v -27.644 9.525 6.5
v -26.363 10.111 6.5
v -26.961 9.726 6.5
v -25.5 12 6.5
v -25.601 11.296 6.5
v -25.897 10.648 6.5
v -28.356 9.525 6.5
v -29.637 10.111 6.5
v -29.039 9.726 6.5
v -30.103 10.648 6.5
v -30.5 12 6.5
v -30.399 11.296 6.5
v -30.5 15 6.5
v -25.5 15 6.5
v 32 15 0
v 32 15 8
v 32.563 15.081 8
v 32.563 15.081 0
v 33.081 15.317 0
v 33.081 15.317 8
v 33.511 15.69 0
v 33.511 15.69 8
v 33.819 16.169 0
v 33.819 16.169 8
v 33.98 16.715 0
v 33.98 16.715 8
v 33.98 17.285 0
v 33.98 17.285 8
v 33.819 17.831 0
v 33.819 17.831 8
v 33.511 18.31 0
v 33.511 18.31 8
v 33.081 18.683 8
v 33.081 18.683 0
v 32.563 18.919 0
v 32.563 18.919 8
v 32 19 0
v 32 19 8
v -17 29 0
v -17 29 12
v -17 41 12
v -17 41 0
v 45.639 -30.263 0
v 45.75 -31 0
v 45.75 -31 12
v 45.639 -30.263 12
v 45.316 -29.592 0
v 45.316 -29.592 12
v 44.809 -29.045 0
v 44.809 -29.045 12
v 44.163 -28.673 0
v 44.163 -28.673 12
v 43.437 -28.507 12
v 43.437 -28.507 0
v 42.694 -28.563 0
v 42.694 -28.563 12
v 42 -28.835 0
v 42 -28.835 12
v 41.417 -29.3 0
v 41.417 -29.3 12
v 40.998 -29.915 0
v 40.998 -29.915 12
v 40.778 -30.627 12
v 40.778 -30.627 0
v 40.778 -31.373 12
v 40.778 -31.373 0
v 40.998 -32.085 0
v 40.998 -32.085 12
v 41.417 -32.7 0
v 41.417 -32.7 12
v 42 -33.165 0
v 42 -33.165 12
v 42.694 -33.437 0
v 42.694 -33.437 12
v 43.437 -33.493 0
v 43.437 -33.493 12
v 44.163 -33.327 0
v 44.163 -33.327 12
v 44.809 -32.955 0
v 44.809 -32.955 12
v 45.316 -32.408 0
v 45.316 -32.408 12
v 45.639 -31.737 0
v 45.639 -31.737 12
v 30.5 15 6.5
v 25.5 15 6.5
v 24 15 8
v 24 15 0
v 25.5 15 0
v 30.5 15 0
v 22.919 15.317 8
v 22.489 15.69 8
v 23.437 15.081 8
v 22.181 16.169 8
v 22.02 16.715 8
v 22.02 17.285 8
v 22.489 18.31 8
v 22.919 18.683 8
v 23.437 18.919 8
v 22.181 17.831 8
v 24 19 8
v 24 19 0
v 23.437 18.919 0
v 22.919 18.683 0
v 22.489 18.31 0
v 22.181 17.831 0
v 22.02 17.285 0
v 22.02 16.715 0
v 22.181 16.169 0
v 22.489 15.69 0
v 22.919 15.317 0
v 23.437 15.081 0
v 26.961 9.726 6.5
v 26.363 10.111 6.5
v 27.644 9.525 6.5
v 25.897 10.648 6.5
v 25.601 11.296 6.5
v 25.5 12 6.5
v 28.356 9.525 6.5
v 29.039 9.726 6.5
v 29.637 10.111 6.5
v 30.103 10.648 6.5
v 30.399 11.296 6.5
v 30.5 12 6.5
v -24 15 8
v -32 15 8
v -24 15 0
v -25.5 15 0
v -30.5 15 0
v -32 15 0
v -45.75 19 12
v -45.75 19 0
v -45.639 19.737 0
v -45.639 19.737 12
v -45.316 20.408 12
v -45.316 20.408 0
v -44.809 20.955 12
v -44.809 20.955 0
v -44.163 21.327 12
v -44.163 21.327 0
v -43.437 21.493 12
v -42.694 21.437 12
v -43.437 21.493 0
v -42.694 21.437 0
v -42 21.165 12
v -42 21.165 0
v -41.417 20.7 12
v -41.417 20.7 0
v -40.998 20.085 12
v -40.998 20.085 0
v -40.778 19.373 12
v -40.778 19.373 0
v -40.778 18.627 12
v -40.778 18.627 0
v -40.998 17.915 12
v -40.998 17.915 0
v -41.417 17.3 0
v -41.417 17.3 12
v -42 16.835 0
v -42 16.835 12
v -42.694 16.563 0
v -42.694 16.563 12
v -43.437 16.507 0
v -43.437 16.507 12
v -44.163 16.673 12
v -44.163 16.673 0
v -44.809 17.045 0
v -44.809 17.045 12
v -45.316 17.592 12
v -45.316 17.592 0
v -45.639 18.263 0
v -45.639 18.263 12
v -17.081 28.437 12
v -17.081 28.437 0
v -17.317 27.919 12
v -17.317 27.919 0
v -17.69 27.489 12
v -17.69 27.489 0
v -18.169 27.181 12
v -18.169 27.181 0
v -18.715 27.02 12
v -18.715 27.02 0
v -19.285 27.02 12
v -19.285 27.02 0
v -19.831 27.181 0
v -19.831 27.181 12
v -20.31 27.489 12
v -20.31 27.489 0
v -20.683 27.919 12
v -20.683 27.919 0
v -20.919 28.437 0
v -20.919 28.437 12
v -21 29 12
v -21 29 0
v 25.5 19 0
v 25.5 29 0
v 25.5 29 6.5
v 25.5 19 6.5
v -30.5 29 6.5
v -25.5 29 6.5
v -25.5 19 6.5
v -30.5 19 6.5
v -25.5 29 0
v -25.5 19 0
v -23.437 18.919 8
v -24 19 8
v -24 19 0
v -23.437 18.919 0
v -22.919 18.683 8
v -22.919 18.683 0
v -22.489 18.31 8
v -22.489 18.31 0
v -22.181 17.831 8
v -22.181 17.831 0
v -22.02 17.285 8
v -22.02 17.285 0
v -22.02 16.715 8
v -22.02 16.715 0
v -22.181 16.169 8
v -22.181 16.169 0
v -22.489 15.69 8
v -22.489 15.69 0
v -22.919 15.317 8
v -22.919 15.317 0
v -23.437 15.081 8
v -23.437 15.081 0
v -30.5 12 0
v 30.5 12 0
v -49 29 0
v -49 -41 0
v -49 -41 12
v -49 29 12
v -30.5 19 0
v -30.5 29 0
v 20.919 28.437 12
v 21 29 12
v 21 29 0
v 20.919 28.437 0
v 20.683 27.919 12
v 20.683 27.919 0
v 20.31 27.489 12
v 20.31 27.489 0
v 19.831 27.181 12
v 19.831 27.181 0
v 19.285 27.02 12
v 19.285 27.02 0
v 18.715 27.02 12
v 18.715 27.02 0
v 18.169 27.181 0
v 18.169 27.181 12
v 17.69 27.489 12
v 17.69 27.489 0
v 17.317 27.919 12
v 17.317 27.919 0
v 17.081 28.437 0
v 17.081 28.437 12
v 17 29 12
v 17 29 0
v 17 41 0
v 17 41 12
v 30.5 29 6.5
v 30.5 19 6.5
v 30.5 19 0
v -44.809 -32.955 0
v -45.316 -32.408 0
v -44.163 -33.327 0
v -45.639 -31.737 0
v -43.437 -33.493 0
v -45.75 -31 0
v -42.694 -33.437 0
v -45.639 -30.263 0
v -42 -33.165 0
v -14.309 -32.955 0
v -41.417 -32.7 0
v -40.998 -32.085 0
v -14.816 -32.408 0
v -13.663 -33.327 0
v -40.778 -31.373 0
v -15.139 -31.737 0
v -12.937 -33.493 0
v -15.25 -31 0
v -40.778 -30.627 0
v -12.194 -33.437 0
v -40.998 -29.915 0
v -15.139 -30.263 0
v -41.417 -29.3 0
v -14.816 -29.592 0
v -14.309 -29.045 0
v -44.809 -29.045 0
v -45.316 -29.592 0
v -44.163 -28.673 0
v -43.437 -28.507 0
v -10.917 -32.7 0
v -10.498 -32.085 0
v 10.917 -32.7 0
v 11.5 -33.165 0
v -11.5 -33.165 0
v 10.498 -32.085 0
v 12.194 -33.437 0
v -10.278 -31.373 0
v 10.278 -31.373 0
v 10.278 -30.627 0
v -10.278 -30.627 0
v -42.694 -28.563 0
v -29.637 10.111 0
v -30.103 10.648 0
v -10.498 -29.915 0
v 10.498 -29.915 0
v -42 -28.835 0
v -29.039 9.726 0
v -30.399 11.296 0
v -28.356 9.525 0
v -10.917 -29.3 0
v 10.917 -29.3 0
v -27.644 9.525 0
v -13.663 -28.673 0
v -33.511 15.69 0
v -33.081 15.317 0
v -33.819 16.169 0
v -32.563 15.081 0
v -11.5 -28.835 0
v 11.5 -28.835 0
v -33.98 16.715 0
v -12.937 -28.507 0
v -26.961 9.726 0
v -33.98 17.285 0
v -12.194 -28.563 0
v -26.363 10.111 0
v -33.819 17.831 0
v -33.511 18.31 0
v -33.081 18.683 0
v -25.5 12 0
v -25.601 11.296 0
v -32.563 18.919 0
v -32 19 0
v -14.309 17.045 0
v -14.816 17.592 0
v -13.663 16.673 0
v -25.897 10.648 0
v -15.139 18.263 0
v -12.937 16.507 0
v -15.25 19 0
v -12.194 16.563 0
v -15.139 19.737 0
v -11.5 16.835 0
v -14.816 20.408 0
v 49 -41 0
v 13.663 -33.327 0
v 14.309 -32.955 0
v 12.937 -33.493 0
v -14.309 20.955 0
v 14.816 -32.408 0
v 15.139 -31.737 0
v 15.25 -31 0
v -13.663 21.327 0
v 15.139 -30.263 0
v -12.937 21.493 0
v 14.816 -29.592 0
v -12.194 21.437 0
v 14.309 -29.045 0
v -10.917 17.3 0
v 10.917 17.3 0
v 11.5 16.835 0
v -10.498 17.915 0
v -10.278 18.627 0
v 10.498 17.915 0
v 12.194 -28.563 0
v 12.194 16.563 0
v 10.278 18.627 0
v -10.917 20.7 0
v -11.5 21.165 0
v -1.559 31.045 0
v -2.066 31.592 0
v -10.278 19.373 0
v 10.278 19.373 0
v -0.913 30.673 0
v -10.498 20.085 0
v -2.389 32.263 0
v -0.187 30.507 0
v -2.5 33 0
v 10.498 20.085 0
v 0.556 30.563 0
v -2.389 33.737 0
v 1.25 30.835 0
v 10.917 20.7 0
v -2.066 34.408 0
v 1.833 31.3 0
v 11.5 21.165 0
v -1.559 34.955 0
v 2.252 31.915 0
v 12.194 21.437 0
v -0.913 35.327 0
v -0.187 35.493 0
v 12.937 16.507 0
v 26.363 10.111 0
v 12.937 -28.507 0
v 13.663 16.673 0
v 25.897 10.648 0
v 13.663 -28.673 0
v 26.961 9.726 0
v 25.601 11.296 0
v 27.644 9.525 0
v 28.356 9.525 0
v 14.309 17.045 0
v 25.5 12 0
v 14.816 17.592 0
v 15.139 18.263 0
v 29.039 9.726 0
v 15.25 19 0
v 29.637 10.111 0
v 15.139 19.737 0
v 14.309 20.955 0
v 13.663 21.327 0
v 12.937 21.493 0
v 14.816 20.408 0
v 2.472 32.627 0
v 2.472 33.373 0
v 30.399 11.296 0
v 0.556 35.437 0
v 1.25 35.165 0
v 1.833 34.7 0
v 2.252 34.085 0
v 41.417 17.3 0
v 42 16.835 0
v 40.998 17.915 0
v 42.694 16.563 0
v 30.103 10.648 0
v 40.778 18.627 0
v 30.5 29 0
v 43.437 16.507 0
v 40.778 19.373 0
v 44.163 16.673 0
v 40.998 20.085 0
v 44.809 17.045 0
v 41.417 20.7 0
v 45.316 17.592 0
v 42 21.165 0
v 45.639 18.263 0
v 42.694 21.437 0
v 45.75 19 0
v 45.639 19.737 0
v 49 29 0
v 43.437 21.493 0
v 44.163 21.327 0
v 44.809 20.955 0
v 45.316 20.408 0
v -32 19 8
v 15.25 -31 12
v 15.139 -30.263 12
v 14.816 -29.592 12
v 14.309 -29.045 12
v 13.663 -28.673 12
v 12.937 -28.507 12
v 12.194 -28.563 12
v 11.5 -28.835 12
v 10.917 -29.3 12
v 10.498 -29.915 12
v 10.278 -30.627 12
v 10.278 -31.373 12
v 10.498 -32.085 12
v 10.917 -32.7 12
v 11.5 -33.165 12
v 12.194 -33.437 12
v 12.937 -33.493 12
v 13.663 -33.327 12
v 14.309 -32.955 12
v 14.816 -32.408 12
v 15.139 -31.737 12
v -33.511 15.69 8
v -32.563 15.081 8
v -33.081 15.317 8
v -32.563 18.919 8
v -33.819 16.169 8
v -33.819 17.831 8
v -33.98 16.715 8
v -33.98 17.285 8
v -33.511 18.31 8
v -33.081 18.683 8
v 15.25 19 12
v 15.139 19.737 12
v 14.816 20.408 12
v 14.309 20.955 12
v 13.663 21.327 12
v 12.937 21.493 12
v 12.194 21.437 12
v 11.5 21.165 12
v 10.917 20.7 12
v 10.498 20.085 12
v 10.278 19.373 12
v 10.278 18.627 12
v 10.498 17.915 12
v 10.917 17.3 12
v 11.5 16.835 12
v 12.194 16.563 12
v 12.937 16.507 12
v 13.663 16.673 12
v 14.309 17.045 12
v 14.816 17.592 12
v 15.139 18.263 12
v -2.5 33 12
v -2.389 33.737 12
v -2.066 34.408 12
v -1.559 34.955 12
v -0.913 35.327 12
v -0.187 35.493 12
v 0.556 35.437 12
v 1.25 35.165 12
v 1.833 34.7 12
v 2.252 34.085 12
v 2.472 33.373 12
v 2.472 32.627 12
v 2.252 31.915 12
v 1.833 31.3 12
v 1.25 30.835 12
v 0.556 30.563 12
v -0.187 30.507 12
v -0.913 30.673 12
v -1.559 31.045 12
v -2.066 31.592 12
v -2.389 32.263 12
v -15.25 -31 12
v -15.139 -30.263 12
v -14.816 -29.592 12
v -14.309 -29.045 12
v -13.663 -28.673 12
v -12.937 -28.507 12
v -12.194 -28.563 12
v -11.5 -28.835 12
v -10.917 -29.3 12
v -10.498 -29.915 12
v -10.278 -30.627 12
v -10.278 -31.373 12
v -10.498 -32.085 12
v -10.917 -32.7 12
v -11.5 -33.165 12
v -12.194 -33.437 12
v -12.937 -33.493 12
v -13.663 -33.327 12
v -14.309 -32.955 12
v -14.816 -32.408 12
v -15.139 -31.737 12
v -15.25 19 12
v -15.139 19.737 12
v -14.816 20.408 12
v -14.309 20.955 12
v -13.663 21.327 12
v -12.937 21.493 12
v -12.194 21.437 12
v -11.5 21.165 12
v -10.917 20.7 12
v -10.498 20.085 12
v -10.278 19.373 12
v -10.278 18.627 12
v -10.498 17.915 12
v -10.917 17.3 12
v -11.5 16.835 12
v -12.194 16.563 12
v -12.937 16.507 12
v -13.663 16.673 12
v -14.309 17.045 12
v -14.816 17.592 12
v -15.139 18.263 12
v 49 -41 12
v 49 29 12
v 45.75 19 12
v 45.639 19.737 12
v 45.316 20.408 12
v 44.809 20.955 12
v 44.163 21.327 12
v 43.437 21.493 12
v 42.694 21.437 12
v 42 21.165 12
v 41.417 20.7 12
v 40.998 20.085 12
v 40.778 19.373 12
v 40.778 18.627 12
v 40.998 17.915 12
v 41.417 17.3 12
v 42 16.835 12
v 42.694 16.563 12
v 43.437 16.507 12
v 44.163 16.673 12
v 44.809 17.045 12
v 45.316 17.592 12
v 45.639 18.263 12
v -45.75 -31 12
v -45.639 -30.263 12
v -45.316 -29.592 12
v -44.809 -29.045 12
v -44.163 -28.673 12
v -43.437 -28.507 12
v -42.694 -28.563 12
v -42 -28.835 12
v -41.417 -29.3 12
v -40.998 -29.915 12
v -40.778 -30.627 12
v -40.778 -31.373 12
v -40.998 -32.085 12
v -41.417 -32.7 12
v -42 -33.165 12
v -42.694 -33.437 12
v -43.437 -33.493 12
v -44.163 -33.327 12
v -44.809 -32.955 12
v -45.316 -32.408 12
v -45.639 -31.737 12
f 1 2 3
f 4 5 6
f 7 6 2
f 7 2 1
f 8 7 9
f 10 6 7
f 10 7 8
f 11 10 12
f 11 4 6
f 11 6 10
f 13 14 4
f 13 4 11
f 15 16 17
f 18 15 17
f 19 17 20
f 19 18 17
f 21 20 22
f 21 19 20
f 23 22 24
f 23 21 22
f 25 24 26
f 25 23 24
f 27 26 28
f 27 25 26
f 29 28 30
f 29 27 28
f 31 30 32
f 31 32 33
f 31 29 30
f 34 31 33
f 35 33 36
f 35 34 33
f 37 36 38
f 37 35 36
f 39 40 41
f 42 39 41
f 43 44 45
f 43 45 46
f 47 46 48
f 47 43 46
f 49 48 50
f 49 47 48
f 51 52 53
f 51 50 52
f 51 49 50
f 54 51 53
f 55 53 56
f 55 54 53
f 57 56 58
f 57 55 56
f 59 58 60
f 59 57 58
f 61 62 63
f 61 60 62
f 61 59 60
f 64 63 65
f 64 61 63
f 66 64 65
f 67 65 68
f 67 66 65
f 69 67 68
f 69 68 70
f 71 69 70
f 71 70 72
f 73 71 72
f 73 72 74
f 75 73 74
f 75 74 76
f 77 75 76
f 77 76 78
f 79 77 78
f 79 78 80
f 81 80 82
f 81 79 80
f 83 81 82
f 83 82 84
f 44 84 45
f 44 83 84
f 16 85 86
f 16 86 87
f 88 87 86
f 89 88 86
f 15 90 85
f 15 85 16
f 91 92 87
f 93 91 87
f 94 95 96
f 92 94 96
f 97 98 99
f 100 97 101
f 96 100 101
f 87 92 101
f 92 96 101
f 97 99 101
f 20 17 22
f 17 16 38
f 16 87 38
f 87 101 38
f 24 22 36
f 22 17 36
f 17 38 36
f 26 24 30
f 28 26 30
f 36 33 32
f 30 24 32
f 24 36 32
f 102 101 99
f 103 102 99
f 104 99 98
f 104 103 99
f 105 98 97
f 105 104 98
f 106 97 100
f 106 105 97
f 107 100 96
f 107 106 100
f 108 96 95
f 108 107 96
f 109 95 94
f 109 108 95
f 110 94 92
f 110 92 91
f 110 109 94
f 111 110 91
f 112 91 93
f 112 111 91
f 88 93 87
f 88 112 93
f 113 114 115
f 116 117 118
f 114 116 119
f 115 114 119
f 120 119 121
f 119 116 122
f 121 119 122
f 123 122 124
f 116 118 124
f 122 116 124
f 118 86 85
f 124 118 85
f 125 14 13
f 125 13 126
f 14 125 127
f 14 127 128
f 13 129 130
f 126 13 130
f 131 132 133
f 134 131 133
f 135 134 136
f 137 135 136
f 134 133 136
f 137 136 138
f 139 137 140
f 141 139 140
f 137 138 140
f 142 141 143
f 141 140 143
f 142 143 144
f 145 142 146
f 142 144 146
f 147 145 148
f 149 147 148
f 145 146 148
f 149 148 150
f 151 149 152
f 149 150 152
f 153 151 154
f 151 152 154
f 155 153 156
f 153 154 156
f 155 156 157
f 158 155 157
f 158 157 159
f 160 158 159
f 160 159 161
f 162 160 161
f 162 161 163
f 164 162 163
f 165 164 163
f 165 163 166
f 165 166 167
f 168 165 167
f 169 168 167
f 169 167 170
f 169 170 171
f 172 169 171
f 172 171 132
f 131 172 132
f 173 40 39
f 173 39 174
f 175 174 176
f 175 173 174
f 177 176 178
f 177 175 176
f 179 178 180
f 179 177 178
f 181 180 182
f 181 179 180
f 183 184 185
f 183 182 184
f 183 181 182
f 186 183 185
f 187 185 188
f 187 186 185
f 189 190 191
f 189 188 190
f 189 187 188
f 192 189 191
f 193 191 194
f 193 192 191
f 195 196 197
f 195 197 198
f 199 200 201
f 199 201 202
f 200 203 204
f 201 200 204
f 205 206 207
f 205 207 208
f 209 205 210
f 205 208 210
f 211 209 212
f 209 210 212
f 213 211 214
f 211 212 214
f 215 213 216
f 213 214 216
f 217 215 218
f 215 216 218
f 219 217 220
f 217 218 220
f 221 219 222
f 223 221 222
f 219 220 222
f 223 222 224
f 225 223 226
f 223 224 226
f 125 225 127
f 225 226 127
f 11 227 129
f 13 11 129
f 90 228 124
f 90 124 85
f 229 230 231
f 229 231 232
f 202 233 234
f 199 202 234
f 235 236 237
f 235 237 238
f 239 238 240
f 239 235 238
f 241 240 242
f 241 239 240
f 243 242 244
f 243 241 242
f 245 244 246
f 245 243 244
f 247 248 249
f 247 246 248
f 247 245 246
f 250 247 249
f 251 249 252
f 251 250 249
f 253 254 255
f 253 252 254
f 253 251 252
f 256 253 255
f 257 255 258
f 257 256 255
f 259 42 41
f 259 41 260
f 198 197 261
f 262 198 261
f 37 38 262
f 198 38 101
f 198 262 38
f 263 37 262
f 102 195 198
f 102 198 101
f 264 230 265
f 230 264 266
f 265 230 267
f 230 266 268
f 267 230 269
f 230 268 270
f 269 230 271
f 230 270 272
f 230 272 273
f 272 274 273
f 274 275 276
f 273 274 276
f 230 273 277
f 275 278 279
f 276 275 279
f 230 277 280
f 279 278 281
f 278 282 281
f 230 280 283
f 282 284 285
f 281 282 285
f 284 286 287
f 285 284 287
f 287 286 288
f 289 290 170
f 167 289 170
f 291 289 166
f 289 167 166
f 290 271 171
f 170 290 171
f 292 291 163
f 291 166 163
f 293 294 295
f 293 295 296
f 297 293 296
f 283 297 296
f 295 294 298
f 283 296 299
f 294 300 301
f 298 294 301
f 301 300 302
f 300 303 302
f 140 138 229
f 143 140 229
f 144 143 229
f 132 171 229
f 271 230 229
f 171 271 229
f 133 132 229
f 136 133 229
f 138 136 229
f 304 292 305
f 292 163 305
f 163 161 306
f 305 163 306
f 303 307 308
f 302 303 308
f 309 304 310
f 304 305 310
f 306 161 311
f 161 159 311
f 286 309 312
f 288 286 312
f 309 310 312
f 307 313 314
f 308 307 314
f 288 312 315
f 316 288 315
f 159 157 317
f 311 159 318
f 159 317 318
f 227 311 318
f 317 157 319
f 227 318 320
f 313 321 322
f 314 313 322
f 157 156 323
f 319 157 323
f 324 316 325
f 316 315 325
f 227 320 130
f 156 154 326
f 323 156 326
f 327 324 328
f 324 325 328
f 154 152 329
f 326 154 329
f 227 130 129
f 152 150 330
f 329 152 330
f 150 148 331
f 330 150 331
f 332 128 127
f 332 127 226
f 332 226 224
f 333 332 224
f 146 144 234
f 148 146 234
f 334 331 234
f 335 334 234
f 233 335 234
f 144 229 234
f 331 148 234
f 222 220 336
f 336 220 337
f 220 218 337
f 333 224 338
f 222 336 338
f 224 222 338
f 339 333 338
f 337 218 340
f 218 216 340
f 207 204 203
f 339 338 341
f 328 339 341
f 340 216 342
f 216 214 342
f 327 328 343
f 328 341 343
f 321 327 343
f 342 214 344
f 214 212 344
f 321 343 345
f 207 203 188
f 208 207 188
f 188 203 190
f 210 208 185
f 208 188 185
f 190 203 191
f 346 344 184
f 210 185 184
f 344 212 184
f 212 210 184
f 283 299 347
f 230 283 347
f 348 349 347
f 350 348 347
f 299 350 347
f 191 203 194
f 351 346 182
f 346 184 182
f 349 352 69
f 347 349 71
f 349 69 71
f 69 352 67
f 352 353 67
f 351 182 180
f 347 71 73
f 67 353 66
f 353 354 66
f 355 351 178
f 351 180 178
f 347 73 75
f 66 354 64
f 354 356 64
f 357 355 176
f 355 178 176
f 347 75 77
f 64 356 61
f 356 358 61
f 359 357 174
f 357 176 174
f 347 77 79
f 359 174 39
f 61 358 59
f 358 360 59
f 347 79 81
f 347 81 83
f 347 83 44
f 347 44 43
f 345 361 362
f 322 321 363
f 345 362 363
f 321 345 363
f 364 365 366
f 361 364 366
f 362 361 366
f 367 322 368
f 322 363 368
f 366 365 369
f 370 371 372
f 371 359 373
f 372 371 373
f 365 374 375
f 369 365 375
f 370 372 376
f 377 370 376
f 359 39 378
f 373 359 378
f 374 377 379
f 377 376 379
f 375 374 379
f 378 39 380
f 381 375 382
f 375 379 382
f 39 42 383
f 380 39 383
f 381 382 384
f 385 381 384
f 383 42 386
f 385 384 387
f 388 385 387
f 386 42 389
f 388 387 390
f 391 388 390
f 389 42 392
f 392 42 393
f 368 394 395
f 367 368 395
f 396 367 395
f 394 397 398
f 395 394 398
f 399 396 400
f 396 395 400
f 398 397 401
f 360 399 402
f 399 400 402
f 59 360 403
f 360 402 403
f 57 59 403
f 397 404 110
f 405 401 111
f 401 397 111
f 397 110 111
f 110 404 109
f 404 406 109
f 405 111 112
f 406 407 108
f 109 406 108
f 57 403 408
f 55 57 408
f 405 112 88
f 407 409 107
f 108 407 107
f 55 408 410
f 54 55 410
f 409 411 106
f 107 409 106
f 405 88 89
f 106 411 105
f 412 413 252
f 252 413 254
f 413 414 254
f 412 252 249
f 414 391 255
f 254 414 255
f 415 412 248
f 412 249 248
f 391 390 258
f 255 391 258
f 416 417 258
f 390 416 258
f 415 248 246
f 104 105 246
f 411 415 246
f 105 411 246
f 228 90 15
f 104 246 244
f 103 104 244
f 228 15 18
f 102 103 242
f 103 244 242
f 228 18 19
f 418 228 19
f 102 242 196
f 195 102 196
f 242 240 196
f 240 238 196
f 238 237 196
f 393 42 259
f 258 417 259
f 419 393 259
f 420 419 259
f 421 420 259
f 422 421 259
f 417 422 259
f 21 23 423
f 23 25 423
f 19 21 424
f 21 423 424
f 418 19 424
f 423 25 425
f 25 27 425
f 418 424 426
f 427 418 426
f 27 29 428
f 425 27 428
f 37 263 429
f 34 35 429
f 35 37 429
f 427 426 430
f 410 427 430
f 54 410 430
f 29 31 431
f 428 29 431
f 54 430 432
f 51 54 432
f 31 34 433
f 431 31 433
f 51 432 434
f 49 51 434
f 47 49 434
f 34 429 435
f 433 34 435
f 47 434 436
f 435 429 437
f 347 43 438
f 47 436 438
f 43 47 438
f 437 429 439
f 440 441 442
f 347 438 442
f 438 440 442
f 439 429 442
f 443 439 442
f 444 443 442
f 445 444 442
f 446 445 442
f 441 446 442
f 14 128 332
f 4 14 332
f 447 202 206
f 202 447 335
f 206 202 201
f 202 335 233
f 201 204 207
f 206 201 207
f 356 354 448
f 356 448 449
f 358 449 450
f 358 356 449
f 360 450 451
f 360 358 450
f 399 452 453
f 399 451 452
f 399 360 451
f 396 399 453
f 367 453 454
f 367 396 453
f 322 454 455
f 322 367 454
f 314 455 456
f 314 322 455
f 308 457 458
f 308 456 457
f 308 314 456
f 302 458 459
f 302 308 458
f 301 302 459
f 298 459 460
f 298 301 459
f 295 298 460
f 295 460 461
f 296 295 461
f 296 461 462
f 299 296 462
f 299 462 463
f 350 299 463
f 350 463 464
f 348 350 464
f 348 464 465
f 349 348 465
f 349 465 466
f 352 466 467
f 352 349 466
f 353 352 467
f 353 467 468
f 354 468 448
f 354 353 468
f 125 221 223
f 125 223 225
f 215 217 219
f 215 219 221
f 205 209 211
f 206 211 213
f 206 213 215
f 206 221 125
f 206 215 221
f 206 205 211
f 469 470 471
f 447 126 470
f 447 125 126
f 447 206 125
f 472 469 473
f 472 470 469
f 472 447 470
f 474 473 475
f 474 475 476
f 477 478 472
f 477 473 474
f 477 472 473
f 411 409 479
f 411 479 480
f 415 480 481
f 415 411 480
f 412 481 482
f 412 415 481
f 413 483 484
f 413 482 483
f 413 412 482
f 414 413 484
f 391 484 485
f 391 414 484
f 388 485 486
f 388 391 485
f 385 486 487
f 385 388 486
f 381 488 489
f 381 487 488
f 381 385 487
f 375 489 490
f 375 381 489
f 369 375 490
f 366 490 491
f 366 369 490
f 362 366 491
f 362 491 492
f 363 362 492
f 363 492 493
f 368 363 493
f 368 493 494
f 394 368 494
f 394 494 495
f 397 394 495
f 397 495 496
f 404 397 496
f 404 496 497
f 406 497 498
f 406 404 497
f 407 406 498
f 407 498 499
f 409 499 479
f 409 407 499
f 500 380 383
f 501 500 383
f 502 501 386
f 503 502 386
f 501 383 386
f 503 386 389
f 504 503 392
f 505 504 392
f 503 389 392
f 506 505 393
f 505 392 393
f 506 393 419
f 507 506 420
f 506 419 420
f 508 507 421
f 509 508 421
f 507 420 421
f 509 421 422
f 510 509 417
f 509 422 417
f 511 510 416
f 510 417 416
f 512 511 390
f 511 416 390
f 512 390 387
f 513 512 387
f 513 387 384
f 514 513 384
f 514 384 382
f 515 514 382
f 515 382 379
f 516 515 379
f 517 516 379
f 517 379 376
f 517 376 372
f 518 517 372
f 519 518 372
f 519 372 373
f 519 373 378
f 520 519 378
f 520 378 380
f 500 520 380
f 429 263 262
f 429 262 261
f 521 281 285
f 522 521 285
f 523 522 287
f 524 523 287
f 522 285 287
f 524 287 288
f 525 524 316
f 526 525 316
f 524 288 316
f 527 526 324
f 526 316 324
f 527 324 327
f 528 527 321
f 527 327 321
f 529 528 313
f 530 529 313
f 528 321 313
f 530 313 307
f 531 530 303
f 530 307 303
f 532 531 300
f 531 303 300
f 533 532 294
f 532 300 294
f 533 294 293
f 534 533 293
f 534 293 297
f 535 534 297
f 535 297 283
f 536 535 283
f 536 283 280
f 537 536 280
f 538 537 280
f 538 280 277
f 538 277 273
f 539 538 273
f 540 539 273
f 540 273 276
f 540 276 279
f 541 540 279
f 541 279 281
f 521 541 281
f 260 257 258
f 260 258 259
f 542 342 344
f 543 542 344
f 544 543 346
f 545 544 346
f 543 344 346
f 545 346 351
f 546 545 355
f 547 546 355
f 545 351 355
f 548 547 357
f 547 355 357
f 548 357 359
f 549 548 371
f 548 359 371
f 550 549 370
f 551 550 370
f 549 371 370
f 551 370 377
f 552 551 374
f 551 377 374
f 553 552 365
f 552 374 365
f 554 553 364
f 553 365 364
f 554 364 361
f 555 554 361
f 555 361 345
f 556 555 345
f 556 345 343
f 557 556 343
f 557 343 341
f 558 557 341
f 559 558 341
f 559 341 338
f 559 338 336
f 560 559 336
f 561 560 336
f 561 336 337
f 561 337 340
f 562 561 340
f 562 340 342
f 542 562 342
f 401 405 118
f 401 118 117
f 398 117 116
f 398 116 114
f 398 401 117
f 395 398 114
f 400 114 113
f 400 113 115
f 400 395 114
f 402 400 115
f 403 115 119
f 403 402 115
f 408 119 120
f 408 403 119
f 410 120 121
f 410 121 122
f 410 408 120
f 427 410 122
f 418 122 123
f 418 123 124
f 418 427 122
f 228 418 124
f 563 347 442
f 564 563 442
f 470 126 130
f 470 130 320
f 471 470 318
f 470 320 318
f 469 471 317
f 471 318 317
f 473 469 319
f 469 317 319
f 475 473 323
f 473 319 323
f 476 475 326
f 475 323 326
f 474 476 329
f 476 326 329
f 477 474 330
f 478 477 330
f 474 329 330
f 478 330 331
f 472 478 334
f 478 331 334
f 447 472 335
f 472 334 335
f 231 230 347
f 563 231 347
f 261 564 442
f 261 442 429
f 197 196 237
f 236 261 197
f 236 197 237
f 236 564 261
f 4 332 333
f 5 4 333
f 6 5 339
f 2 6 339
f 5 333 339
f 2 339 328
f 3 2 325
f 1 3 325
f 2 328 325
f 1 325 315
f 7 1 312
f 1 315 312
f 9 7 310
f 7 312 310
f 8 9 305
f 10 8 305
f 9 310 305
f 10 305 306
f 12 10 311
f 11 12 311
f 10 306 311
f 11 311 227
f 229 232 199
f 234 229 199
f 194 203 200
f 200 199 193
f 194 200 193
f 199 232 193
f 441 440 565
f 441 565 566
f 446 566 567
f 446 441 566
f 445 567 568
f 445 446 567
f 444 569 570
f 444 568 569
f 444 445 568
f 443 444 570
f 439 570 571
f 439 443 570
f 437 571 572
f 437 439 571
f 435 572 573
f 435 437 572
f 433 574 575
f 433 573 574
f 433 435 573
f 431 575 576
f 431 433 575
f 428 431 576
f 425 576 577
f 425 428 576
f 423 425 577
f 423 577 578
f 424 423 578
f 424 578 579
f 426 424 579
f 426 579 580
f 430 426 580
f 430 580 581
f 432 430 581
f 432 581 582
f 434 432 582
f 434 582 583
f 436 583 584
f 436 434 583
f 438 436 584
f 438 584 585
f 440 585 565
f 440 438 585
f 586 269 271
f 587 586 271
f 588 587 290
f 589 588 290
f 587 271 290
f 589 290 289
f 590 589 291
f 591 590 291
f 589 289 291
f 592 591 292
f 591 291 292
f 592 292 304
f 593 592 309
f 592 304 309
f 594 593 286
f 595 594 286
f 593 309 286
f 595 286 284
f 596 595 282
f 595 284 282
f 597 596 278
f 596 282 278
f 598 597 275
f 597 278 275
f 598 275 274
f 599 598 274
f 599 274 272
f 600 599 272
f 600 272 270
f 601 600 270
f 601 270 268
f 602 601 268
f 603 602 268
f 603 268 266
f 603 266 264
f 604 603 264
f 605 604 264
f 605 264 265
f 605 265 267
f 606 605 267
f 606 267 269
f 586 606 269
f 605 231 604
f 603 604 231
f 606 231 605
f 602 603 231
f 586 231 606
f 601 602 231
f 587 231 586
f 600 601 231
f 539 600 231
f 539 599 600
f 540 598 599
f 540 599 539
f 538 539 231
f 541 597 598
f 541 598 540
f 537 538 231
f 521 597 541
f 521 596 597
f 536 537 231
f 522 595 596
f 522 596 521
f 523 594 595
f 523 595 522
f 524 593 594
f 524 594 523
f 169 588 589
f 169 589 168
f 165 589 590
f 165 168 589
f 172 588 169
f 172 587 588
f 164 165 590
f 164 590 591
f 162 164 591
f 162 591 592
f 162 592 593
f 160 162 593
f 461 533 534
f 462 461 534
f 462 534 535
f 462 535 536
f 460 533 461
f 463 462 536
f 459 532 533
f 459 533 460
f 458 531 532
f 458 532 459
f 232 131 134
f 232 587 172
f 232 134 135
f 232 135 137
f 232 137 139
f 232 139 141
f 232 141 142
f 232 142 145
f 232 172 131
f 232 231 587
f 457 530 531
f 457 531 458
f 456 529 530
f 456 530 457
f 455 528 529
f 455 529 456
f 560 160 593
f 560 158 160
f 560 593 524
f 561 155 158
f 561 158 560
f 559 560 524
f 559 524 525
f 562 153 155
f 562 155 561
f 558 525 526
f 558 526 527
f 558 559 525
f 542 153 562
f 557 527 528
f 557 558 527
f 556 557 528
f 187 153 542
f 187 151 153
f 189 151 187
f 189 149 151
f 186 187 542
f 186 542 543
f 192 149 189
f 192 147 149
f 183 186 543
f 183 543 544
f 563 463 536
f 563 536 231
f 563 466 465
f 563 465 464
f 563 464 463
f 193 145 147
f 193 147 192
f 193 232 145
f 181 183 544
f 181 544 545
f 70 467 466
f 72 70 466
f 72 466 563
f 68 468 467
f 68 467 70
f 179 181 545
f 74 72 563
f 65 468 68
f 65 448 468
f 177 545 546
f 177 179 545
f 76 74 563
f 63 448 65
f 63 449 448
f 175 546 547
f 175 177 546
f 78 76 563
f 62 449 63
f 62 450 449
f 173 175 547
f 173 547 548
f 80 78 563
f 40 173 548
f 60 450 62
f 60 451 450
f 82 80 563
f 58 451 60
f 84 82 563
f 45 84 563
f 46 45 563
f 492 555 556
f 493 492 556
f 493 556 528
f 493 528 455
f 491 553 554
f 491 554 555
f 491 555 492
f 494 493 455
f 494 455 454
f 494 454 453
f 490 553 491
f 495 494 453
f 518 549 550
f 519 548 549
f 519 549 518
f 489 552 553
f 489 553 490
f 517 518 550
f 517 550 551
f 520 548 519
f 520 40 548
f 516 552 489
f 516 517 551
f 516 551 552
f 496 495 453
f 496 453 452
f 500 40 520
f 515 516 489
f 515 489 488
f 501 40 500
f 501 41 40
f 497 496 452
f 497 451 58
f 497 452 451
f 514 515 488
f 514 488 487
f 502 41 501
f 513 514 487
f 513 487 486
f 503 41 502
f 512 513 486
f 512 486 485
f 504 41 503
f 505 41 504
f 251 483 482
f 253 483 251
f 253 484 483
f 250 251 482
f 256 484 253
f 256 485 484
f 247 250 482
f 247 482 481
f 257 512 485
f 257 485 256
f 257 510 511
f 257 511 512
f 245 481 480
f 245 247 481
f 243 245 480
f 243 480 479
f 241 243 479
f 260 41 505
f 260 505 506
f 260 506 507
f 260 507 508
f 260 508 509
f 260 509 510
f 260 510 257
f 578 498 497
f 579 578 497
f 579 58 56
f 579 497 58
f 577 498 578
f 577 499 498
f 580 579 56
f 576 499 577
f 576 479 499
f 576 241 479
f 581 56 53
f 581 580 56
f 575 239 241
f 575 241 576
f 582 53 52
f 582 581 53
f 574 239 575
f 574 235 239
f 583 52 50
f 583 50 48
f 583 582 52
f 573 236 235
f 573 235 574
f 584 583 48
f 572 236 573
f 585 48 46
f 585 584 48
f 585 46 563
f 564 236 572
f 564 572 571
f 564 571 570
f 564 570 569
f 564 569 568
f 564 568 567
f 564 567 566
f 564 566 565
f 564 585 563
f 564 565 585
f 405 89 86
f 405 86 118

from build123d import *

# Parameters (mm, degrees)
SKETCH1_W                = 98
SKETCH1_H                = 82
BOSS_EXTRUDE1_DEPTH      = 12
CUT_EXTRUDE1_REACH       = 67.008
SKETCH4_W                = 32
SKETCH4_H                = 12
F_5_0_5_DIAMETER_HOLE2_D = 5
F_5_0_5_DIAMETER_HOLE3_D = 5
CUT_EXTRUDE3_DEPTH       = 8
CUT_EXTRUDE4_DEPTH       = 6.5
F_5_0_5_DIAMETER_HOLE1_D = 5
CUT_EXTRUDE2_REACH       = 67.008


# Read off the part's stored shape, not the designer's step: Cut-Extrude3
with BuildPart() as part:
    # Sketch1 → Boss-Extrude1 (new body)
    with BuildSketch(Plane.XY):
        Rectangle(SKETCH1_W, SKETCH1_H)
    extrude(amount=BOSS_EXTRUDE1_DEPTH)

    # Sketch4 → Cut-Extrude1 (cut, up to next)
    with BuildSketch(Plane.XY.offset(12), mode=Mode.PRIVATE) as cut_extrude1_sk1:
        with Locations((-33, 35)):
            Rectangle(SKETCH4_W, SKETCH4_H)
    cut_extrude1_tool1 = extrude(cut_extrude1_sk1.sketch, amount=-CUT_EXTRUDE1_REACH, mode=Mode.PRIVATE) & part.part
    cut_extrude1 = cut_extrude1_tool1.solids().sort_by_distance((-33, 35, 12))[0]
    add(cut_extrude1, mode=Mode.SUBTRACT)

    # Mirror2: Cut-Extrude1 across plane
    add(cut_extrude1.mirror(Plane(origin=(0, 0, 0), x_dir=(0, 0, 1), z_dir=(1, 0, 0))), mode=Mode.SUBTRACT)

    # Ø5.0 (5) Diameter Hole2 (through all)
    with Locations(Plane.XY.offset(12)):
        with Locations((-12.75, 19), (-12.75, -31)):
            f_5_0_5_diameter_hole2 = Hole(F_5_0_5_DIAMETER_HOLE2_D / 2)

    # Ø5.0 (5) Diameter Hole3 (through all)
    with Locations(Plane.XY.offset(12)):
        with Locations((-43.25, 19), (-43.25, -31)):
            f_5_0_5_diameter_hole3 = Hole(F_5_0_5_DIAMETER_HOLE3_D / 2)

    # Cut-Extrude3 outline → Cut-Extrude3 (cut)
    with BuildSketch(Plane.XY):
        with BuildLine():
            ThreePointArc((32, 15), (34, 17), (32, 19))
            Line((32, 19), (24, 19))
            ThreePointArc((24, 19), (22, 17), (24, 15))
            Line((24, 15), (32, 15))
        make_face()
    cut_extrude3 = extrude(amount=CUT_EXTRUDE3_DEPTH, mode=Mode.SUBTRACT)

    # Sketch20 → Cut-Extrude4 (cut)
    with BuildSketch(Plane(origin=(39.292468455, 97.580435701, 0), x_dir=(-1, 0, 0), z_dir=(0, 0, -1))):
        with BuildLine():
            Line((13.792468455, -19.569462754), (13.792468455, -85.580435701))
            ThreePointArc((13.792468455, -85.580435701), (11.292468455, -88.080435701), (8.792468455, -85.580435701))
            Line((8.792468455, -85.580435701), (8.792468455, -19.569462754))
            ThreePointArc((8.792468455, -19.569462754), (11.292468455, -17.069462754), (13.792468455, -19.569462754))
        make_face()
    cut_extrude4 = extrude(amount=-CUT_EXTRUDE4_DEPTH, mode=Mode.SUBTRACT)

    # Mirror1: Ø5.0 (5) Diameter Hole2, Ø5.0 (5) Diameter Hole3, Cut-Extrude3, Cut-Extrude4 across plane
    add(f_5_0_5_diameter_hole2.mirror(Plane(origin=(0, 0, 0), x_dir=(0, 0, 1), z_dir=(1, 0, 0))), mode=Mode.SUBTRACT)
    add(f_5_0_5_diameter_hole3.mirror(Plane(origin=(0, 0, 0), x_dir=(0, 0, 1), z_dir=(1, 0, 0))), mode=Mode.SUBTRACT)
    add(cut_extrude3.mirror(Plane(origin=(0, 0, 0), x_dir=(0, 0, 1), z_dir=(1, 0, 0))), mode=Mode.SUBTRACT)
    add(cut_extrude4.mirror(Plane(origin=(0, 0, 0), x_dir=(0, 0, 1), z_dir=(1, 0, 0))), mode=Mode.SUBTRACT)

    # Ø5.0 (5) Diameter Hole1 (through all)
    with Locations(Plane.XY.offset(12)):
        with Locations((0, 33)):
            Hole(F_5_0_5_DIAMETER_HOLE1_D / 2)

    # Sketch16 → Cut-Extrude2 (cut, up to next)
    with BuildSketch(Plane.XY.offset(12), mode=Mode.PRIVATE) as cut_extrude2_sk1:
        with BuildLine():
            Line((-21, 29), (-17, 29))
            ThreePointArc((-17, 29), (-19, 27), (-21, 29))
        make_face()
    cut_extrude2_tool1 = extrude(cut_extrude2_sk1.sketch, amount=-CUT_EXTRUDE2_REACH, mode=Mode.PRIVATE) & part.part
    # Sketch16 → Cut-Extrude2 (cut, up to next)
    with BuildSketch(Plane.XY.offset(12), mode=Mode.PRIVATE) as cut_extrude2_sk2:
        with BuildLine():
            Line((17, 29), (21, 29))
            ThreePointArc((21, 29), (19, 27), (17, 29))
        make_face()
    cut_extrude2_tool2 = extrude(cut_extrude2_sk2.sketch, amount=-CUT_EXTRUDE2_REACH, mode=Mode.PRIVATE) & part.part
    add(cut_extrude2_tool1.solids().sort_by_distance((-19, 28.151174, 12))[0], mode=Mode.SUBTRACT)
    add(cut_extrude2_tool2.solids().sort_by_distance((19, 28.151174, 12))[0], mode=Mode.SUBTRACT)


solid = part.part
